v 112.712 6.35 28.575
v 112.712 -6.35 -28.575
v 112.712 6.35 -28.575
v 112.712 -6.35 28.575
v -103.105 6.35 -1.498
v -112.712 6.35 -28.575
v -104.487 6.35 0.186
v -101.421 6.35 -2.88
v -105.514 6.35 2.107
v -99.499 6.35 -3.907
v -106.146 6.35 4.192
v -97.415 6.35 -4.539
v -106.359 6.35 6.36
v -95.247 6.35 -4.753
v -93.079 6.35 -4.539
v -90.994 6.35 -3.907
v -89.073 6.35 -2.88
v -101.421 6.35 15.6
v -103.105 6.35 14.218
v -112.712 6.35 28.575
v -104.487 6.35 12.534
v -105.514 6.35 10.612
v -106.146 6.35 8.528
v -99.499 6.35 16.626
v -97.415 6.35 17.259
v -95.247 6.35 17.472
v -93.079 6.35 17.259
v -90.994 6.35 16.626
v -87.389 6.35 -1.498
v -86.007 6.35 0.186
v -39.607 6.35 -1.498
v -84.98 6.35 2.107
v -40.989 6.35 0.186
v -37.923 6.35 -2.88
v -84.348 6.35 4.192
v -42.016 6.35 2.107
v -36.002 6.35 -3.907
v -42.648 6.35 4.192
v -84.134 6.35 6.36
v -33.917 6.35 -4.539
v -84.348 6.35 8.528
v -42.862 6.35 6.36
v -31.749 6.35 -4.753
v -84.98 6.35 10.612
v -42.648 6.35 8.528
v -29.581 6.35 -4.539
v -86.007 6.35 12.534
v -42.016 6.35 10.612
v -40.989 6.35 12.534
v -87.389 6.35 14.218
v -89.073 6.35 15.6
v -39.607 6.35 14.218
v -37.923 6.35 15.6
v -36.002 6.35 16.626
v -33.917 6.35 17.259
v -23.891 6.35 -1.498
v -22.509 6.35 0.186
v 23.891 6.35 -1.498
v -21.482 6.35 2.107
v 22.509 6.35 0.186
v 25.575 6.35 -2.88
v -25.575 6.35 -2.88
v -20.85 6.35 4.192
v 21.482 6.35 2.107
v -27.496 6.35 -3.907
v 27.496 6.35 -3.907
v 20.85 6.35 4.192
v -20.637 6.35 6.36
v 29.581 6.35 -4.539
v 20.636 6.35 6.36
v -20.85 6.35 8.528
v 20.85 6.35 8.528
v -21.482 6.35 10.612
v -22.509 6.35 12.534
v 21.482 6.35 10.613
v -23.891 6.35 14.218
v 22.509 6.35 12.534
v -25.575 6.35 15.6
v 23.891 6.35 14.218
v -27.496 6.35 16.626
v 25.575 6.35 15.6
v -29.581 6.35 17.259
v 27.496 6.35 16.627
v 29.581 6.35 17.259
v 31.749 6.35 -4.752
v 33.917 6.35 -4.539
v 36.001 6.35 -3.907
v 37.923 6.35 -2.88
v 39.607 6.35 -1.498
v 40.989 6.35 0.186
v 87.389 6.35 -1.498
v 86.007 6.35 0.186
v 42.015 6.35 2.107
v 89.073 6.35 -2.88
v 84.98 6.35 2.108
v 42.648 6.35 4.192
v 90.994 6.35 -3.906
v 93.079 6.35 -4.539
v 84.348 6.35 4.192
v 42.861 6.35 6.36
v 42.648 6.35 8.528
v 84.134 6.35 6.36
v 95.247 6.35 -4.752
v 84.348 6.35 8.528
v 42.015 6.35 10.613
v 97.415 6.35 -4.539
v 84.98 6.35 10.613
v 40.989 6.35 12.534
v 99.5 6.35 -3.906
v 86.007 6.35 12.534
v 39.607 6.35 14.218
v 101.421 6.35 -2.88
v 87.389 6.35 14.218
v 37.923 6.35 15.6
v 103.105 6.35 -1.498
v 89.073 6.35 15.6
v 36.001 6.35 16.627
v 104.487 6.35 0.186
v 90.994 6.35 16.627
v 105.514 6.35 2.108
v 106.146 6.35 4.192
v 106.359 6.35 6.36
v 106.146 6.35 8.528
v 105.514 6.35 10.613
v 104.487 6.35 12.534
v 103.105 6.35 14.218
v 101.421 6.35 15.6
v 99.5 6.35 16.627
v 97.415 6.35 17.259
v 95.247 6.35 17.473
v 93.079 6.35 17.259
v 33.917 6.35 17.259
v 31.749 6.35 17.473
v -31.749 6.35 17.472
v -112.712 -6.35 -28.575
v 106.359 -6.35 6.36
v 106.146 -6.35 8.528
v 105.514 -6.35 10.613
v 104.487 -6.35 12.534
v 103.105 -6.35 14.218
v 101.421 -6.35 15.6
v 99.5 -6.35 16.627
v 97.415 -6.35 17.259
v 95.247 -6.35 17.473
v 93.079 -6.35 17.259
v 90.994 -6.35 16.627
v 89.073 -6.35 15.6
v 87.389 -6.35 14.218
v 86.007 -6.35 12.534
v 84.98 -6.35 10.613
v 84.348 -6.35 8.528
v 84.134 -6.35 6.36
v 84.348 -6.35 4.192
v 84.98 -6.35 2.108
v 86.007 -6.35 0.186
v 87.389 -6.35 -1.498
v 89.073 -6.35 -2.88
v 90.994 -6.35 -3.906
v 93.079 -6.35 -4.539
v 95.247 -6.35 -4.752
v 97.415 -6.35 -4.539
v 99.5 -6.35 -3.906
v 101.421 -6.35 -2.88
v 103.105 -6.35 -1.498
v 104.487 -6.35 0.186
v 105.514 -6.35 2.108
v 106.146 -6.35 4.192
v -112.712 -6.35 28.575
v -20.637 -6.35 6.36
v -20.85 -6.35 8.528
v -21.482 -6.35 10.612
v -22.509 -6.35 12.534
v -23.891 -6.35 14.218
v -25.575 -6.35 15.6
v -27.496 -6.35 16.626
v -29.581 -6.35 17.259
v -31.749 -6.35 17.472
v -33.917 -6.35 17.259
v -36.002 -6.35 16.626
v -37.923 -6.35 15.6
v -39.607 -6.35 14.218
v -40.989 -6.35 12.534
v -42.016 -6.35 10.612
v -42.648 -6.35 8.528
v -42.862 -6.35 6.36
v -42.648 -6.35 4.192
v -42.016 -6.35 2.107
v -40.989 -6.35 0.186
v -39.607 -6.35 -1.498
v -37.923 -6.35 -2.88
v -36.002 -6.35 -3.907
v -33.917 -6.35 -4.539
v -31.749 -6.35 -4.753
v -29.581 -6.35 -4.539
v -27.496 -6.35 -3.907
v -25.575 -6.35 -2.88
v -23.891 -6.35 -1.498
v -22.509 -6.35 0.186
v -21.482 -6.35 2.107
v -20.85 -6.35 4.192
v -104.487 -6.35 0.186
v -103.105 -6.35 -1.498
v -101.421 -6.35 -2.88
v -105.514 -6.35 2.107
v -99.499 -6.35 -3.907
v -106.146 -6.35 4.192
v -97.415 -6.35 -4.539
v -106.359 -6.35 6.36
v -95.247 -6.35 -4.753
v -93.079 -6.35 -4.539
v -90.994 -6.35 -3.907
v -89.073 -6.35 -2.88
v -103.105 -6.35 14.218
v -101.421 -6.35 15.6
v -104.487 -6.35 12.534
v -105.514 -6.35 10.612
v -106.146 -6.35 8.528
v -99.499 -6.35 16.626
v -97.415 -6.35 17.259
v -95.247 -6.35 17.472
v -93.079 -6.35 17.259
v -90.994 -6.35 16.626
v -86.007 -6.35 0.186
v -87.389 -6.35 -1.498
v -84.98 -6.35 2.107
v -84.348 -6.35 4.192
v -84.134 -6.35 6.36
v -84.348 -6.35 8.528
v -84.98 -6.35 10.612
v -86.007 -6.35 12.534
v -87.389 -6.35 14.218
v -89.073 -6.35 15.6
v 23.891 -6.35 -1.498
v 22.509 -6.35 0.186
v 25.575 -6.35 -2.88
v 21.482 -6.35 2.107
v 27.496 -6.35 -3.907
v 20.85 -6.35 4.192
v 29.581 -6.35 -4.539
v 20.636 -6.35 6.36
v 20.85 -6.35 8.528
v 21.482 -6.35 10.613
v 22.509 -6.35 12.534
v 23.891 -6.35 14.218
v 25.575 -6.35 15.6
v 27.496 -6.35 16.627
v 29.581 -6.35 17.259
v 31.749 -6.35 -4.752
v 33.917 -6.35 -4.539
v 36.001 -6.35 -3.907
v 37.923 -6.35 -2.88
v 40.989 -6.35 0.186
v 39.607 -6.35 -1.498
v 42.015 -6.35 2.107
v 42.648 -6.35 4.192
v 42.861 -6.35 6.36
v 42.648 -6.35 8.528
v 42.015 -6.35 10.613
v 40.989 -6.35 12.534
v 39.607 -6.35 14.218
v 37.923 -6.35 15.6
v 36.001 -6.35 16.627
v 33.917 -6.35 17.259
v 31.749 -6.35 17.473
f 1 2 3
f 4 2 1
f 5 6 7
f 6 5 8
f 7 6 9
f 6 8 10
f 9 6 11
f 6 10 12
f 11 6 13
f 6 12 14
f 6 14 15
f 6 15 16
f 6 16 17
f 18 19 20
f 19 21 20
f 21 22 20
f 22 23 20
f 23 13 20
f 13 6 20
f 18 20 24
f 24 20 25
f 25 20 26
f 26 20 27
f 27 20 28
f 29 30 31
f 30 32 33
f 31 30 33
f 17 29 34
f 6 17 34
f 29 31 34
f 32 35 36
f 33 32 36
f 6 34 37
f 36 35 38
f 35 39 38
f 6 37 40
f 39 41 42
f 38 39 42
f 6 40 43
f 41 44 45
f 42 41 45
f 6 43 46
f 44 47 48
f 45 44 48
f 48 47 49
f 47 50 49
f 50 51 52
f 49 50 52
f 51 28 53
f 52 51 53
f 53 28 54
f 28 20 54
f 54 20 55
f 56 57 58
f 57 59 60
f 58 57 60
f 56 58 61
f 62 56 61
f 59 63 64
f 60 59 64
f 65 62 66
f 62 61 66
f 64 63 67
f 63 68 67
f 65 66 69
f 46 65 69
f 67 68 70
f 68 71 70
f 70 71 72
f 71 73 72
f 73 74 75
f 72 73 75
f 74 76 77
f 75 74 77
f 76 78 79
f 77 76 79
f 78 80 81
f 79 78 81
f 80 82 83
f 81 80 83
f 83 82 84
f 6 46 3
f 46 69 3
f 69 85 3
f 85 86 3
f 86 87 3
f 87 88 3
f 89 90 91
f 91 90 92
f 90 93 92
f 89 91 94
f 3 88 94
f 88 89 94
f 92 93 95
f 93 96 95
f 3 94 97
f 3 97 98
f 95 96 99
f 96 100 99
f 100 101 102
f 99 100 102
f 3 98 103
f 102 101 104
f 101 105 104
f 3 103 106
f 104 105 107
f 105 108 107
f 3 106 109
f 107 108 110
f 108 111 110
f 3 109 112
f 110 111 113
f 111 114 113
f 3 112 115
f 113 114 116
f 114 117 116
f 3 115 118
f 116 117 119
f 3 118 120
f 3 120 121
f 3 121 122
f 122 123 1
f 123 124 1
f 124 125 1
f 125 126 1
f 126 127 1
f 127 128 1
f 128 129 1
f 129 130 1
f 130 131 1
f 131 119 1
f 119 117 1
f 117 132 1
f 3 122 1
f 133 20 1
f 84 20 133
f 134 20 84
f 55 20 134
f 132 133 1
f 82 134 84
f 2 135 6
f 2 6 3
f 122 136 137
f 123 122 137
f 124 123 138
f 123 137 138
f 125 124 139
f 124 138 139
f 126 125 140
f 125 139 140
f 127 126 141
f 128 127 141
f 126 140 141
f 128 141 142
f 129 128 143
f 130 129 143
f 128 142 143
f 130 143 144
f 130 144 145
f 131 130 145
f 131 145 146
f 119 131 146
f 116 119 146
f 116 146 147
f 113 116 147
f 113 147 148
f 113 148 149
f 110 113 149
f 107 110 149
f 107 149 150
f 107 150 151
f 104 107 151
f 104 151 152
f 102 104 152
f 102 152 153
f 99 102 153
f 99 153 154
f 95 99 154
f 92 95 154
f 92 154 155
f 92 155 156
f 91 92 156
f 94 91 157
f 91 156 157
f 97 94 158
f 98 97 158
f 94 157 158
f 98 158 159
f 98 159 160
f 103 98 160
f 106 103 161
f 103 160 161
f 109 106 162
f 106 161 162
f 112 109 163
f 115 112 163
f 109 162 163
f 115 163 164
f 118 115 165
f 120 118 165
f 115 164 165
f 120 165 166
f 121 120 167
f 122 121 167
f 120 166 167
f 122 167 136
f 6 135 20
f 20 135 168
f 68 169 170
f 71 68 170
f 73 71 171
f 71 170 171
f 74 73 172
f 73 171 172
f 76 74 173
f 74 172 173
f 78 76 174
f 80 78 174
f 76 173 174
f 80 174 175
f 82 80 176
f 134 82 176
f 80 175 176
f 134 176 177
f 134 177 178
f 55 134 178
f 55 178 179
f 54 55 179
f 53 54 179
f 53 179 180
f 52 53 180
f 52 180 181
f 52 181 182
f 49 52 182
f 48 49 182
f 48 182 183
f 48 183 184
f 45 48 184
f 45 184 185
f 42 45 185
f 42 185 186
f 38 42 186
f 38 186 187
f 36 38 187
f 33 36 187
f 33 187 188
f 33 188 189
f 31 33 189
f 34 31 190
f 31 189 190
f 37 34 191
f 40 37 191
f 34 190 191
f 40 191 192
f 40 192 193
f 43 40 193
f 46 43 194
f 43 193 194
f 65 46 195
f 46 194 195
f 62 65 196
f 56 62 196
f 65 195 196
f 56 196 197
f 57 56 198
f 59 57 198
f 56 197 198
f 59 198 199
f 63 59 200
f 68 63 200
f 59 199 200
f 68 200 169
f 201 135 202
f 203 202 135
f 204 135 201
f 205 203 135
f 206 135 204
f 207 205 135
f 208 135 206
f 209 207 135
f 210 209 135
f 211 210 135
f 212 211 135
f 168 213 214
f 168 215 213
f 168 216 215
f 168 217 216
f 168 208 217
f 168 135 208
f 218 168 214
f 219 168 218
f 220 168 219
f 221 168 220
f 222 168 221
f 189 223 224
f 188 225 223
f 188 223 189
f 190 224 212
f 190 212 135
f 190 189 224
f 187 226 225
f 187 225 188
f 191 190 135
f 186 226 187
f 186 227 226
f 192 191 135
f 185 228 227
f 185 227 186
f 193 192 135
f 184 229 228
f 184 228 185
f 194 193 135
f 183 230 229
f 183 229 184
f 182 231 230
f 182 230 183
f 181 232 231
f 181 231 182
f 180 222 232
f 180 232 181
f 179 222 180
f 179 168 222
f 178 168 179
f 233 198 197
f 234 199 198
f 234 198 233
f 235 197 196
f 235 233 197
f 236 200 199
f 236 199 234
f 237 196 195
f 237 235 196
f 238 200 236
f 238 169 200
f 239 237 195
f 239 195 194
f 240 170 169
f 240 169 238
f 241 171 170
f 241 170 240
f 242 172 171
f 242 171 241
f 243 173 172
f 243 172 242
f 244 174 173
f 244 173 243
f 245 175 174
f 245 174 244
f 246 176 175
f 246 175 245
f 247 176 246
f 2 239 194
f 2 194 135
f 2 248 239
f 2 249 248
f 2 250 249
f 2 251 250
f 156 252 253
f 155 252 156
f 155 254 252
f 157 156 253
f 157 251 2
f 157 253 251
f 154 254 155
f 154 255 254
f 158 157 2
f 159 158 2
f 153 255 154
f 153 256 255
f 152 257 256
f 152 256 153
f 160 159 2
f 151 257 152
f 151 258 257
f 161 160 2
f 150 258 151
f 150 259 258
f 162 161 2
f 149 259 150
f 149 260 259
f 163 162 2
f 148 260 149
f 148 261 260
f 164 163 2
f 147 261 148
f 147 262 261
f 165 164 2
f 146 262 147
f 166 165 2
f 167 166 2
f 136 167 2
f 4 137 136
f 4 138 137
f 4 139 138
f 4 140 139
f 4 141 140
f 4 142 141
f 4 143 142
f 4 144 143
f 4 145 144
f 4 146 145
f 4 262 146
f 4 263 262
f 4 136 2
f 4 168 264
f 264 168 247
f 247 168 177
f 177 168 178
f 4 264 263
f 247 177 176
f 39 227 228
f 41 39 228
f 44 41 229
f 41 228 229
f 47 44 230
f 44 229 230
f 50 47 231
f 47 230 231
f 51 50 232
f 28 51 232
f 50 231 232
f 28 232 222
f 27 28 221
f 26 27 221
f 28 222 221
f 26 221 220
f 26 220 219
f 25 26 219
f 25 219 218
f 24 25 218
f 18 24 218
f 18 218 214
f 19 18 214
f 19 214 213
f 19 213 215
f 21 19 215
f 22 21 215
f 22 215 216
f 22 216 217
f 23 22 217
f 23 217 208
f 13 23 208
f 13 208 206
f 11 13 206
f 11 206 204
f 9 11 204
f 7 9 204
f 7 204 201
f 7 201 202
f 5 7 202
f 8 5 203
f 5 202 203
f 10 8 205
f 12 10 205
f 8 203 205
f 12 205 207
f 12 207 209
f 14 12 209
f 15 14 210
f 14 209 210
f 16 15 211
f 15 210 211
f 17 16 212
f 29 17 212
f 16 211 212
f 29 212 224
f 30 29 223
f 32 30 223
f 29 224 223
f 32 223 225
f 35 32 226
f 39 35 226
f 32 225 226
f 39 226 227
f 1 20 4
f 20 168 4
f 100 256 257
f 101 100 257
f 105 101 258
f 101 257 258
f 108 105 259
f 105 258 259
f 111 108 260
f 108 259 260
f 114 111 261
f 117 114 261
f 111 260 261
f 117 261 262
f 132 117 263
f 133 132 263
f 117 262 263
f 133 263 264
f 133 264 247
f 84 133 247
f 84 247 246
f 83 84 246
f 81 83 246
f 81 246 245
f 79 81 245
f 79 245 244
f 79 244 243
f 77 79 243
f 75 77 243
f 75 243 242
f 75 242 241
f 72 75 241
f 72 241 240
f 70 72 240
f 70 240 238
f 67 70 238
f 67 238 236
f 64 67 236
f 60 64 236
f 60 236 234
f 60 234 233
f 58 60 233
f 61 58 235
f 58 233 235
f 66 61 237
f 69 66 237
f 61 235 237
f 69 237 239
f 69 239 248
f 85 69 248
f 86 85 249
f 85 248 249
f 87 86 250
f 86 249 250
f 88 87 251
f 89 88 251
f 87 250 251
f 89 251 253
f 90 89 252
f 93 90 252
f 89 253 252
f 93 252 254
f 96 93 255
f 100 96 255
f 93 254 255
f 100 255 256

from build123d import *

# Parameters (mm, degrees)
F0_W     = 225.425
F0_H     = 57.15
F1_DEPTH = 6.35
F3_DEPTH = 12.701


with BuildPart() as f1:
    # F0 (on Front) → F1 (new body, symmetric)
    with BuildSketch(Plane.XZ):
        Rectangle(F0_W, F0_H)
    extrude(amount=F1_DEPTH, both=True)

    # F2 (on face) → F3 (cut, through all)
    with BuildSketch(Plane.XZ.offset(6.35)):
        with BuildLine():
            Line((-84.1344035983, 6.3598155975), (-106.3594035983, 6.3598155975))
            ThreePointArc((-106.3594035983, 6.3598155975), (-95.2469035983, -4.7526844025), (-84.1344035983, 6.3598155975))
        make_face()
        with BuildLine():
            ThreePointArc((-84.1344035983, 6.3598155975), (-95.2469035983, 17.4723155975), (-106.3594035983, 6.3598155975))
            Line((-106.3594035983, 6.3598155975), (-84.1344035983, 6.3598155975))
        make_face()
        with BuildLine():
            Line((-20.6365519956, 6.359861698), (-42.8615519956, 6.359861698))
            ThreePointArc((-42.8615519956, 6.359861698), (-31.7490519956, -4.752638302), (-20.6365519956, 6.359861698))
        make_face()
        with BuildLine():
            ThreePointArc((-20.6365519956, 6.359861698), (-31.7490519956, 17.472361698), (-42.8615519956, 6.359861698))
            Line((-42.8615519956, 6.359861698), (-20.6365519956, 6.359861698))
        make_face()
        with BuildLine():
            Line((42.8613498986, 6.3600256108), (20.6363498986, 6.3600256108))
            ThreePointArc((20.6363498986, 6.3600256108), (31.7488498986, -4.7524743892), (42.8613498986, 6.3600256108))
        make_face()
        with BuildLine():
            ThreePointArc((42.8613498986, 6.3600256108), (31.7488498986, 17.4725256108), (20.6363498986, 6.3600256108))
            Line((20.6363498986, 6.3600256108), (42.8613498986, 6.3600256108))
        make_face()
        with BuildLine():
            Line((106.3594967306, 6.360122934), (84.1344967306, 6.360122934))
            ThreePointArc((84.1344967306, 6.360122934), (95.2469967306, -4.752377066), (106.3594967306, 6.360122934))
        make_face()
        with BuildLine():
            ThreePointArc((106.3594967306, 6.360122934), (95.2469967306, 17.472622934), (84.1344967306, 6.360122934))
            Line((84.1344967306, 6.360122934), (106.3594967306, 6.360122934))
        make_face()
    extrude(amount=-F3_DEPTH, mode=Mode.SUBTRACT)


solid = f1.part
